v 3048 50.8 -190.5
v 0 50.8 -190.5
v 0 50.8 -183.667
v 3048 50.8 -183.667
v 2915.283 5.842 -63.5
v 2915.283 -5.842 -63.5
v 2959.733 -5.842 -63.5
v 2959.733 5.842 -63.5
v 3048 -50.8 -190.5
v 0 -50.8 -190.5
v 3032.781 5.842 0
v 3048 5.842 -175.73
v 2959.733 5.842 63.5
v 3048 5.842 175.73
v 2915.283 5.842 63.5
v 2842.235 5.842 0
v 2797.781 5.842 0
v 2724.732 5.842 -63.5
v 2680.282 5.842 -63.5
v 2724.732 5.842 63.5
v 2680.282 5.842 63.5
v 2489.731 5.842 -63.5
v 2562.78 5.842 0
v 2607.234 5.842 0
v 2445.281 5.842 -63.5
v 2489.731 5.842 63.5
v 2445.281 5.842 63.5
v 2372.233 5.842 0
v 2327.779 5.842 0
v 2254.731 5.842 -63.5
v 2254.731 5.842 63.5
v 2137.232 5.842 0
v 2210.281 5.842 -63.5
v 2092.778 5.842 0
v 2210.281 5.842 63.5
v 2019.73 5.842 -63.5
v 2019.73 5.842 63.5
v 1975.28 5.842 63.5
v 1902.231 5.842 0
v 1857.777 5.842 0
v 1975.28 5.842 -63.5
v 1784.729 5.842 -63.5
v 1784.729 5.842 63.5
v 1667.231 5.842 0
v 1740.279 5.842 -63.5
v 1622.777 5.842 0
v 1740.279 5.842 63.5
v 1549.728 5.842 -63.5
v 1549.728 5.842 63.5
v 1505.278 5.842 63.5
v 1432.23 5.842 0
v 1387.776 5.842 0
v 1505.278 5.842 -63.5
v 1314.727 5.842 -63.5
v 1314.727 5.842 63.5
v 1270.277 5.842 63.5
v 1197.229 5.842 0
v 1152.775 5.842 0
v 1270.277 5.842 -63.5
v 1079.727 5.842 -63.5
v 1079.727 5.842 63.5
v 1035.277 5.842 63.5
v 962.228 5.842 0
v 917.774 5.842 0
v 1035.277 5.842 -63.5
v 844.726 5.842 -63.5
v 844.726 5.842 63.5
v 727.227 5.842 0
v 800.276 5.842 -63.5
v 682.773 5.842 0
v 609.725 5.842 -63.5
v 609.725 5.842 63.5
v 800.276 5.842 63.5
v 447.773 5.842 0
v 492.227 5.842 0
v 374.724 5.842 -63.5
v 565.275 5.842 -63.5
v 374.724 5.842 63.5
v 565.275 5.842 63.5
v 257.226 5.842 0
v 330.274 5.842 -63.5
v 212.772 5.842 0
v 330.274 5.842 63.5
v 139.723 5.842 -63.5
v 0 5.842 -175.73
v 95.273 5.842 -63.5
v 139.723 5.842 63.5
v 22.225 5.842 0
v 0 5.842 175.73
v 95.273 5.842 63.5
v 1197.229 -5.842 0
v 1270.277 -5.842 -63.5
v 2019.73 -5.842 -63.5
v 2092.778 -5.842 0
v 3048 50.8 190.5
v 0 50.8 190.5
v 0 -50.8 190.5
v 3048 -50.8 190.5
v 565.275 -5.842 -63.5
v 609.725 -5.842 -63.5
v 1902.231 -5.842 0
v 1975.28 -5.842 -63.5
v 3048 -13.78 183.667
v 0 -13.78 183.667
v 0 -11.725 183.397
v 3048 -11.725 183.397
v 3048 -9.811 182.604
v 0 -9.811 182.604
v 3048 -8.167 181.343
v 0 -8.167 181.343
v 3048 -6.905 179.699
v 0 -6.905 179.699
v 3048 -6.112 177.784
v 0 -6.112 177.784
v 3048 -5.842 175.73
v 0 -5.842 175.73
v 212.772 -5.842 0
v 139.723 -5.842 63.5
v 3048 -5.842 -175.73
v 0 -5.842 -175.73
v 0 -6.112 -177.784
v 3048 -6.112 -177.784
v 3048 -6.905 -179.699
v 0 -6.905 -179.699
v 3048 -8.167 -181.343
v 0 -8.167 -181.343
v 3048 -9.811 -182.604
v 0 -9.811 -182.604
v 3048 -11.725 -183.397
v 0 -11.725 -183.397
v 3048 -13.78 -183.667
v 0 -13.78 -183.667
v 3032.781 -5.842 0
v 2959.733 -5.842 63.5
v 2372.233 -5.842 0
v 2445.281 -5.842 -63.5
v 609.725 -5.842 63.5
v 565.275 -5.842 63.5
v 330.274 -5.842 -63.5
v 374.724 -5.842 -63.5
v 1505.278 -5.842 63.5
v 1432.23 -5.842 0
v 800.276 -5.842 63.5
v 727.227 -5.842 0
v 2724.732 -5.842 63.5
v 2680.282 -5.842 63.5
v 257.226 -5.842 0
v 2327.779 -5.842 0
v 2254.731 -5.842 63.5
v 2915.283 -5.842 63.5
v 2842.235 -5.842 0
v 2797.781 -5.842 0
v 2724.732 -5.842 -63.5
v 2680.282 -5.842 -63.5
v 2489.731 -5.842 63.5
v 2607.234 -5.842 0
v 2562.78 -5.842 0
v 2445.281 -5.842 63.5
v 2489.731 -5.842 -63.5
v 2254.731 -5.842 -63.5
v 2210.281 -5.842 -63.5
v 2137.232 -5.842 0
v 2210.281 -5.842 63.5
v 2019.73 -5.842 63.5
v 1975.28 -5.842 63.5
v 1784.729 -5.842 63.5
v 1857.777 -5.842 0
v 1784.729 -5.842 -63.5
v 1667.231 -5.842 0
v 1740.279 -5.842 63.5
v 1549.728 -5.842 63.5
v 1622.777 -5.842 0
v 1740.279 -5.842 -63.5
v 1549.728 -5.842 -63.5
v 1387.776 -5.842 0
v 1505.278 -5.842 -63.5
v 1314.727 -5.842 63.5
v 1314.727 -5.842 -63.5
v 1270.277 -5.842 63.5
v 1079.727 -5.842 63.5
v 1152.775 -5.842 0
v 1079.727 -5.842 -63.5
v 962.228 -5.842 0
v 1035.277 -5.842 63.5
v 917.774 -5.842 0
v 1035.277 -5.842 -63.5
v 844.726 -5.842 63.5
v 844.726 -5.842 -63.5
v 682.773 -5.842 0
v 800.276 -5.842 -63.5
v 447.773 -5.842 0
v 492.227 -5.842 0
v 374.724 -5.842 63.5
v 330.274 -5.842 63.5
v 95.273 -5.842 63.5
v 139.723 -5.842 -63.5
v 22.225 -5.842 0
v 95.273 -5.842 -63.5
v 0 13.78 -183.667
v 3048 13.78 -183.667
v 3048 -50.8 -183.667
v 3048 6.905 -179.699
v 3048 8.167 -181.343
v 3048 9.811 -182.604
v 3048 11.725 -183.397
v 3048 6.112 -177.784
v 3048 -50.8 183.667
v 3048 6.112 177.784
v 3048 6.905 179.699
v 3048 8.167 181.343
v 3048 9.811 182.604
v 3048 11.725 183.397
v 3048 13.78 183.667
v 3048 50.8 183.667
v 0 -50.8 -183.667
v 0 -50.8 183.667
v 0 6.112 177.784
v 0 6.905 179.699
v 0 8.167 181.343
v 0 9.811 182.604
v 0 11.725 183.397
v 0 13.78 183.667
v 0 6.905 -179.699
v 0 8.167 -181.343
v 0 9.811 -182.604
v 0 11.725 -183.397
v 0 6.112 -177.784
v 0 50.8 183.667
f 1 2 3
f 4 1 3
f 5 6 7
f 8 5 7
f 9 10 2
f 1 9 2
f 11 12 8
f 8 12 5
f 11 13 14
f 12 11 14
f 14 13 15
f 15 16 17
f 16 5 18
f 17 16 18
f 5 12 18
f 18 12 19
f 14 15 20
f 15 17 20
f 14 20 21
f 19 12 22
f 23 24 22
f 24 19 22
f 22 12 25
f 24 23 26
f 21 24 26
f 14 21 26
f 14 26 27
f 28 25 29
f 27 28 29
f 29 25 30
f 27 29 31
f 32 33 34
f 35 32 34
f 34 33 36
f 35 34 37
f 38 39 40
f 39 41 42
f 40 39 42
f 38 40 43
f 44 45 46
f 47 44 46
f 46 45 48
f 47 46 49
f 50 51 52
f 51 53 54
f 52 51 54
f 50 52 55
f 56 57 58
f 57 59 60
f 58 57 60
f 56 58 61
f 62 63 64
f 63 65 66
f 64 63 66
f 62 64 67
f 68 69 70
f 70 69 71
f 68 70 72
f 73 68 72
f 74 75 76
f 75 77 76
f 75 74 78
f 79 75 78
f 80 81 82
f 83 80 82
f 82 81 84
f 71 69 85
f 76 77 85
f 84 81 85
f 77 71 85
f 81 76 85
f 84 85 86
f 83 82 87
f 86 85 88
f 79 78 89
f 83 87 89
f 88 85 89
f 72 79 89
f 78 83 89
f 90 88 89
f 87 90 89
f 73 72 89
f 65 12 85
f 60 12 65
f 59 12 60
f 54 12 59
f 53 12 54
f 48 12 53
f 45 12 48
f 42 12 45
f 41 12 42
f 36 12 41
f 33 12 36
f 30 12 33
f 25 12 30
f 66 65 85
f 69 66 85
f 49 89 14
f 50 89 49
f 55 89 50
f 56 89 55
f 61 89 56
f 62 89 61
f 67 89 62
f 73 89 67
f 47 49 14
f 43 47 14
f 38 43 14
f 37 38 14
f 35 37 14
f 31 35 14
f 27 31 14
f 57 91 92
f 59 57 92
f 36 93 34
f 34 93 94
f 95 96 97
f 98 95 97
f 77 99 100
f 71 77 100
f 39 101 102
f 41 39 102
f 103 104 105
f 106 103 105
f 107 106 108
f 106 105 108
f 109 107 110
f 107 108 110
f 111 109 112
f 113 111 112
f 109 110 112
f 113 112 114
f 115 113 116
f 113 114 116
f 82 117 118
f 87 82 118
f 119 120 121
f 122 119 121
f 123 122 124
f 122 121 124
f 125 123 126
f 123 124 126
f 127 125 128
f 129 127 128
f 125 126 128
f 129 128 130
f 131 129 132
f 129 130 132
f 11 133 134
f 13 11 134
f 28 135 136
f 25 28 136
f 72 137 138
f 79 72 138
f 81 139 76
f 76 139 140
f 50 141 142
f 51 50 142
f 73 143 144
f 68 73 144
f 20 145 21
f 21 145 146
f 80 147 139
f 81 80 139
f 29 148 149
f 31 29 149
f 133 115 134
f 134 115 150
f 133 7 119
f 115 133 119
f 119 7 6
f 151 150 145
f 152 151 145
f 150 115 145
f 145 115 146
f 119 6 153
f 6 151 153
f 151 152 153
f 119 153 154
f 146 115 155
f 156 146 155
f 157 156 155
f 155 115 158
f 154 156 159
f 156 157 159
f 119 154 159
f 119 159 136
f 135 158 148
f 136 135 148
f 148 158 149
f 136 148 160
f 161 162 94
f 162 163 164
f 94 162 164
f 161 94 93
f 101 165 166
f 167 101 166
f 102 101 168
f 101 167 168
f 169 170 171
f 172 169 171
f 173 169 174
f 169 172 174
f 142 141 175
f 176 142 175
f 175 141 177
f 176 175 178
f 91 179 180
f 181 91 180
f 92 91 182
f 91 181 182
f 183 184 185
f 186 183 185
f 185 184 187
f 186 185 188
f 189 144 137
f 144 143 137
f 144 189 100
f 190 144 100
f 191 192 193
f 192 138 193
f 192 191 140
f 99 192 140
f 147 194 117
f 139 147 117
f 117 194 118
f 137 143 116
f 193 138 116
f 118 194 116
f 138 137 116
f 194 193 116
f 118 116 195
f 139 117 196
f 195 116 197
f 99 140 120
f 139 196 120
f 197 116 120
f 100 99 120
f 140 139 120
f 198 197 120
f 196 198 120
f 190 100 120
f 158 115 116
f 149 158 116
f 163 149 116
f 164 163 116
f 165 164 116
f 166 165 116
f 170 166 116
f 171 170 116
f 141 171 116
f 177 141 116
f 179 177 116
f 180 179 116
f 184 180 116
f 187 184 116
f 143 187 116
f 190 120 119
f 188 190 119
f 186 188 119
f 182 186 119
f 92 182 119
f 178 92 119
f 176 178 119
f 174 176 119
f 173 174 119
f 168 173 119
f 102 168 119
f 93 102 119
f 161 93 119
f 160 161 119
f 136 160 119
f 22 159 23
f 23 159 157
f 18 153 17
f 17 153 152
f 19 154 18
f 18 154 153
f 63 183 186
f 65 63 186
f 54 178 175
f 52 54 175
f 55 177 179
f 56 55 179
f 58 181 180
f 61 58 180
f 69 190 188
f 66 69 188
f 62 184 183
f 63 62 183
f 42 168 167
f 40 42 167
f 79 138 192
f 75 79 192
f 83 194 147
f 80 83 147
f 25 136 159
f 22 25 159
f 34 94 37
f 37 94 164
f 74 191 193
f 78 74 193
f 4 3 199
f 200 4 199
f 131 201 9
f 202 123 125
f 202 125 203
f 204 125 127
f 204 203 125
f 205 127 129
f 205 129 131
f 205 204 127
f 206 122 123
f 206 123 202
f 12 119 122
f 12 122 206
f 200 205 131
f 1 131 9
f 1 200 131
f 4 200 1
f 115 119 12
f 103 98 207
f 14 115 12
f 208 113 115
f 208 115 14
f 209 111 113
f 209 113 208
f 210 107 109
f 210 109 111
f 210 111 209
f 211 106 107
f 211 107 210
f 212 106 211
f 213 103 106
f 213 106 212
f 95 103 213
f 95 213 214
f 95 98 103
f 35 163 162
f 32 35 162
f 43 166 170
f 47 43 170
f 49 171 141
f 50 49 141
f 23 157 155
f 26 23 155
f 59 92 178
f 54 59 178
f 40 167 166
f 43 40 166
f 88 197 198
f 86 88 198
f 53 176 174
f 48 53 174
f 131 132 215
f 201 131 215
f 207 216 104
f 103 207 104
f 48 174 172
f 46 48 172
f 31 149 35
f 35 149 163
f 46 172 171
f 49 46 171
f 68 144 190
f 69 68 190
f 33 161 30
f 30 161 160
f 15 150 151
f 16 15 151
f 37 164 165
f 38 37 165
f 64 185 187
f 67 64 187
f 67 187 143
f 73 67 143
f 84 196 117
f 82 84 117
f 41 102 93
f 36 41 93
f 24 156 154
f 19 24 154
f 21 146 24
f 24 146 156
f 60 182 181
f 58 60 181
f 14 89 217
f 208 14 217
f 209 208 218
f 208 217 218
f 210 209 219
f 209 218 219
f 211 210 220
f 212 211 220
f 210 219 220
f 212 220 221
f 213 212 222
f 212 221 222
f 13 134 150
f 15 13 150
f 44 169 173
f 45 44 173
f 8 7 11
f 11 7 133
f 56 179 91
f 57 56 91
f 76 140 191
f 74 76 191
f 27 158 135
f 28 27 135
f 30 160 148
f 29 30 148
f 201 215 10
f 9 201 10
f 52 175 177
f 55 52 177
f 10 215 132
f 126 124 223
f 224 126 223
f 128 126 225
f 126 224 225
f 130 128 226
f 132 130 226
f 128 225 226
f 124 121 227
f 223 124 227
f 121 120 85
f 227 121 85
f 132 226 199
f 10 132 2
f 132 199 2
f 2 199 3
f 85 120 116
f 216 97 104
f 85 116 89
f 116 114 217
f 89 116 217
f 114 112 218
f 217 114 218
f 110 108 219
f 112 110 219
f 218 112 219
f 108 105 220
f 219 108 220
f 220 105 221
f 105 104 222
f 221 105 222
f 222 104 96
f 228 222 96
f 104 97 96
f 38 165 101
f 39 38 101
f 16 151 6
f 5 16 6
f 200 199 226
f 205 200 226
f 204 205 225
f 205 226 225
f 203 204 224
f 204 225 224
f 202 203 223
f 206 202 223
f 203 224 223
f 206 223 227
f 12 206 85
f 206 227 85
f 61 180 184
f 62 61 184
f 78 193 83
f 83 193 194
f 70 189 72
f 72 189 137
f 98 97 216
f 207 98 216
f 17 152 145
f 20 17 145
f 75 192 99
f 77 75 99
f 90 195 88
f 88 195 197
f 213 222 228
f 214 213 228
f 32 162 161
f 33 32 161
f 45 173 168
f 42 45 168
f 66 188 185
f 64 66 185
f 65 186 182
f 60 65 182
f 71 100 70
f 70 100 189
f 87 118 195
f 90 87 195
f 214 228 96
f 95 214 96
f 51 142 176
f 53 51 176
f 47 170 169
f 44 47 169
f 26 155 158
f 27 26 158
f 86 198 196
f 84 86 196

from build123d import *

# Parameters (mm, degrees)
F1_DEPTH = 3048
F3_DEPTH = 56.643


with BuildPart() as f1:
    # F0 (on Right) → F1 (new body)
    with BuildSketch(Plane.YZ):
        with BuildLine():
            Line((-5.842, 175.7299), (-5.842, 0))
            Line((-5.842, 0), (-5.842, -175.7299))
            ThreePointArc((-5.842, -175.7299), (-8.16684, -181.34256), (-13.7795, -183.6674))
            Line((-13.7795, -183.6674), (-50.8, -183.6674))
            Line((-50.8, -183.6674), (-50.8, -190.5))
            Line((-50.8, -190.5), (0, -190.5))
            Line((0, -190.5), (50.8, -190.5))
            Line((50.8, -190.5), (50.8, -183.6674))
            Line((50.8, -183.6674), (13.7795, -183.6674))
            ThreePointArc((13.7795, -183.6674), (8.16684, -181.34256), (5.842, -175.7299))
            Line((5.842, -175.7299), (5.842, 0))
            Line((5.842, 0), (5.842, 175.7299))
            ThreePointArc((5.842, 175.7299), (8.16684, 181.34256), (13.7795, 183.6674))
            Line((13.7795, 183.6674), (50.8, 183.6674))
            Line((50.8, 183.6674), (50.8, 190.5))
            Line((50.8, 190.5), (0, 190.5))
            Line((0, 190.5), (-50.8, 190.5))
            Line((-50.8, 190.5), (-50.8, 183.6674))
            Line((-50.8, 183.6674), (-13.7795, 183.6674))
            ThreePointArc((-13.7795, 183.6674), (-8.16684, 181.34256), (-5.842, 175.7299))
        make_face()
    extrude(amount=F1_DEPTH)

    # F2 (on face) → F3 (cut, through all)
    with BuildSketch(Plane.XZ.offset(5.842)):
        Polygon((95.273394, 63.5), (22.225, 0), (95.273394, -63.5), (139.723394, -63.5), (212.771788, 0), (139.723394, 63.5), align=None)
        Polygon((374.724194, 63.5), (330.274194, 63.5), (257.2258, 0), (330.274194, -63.5), (374.724194, -63.5), (447.772588, 0), align=None)
        Polygon((609.724994, 63.5), (565.274994, 63.5), (492.2266, 0), (565.274994, -63.5), (609.724994, -63.5), (682.773388, 0), align=None)
        Polygon((844.725794, 63.5), (800.275794, 63.5), (727.2274, 0), (800.275794, -63.5), (844.725794, -63.5), (917.774188, 0), align=None)
        Polygon((1079.726594, 63.5), (1035.276594, 63.5), (962.2282, 0), (1035.276594, -63.5), (1079.726594, -63.5), (1152.774988, 0), align=None)
        Polygon((1314.727394, 63.5), (1270.277394, 63.5), (1197.229, 0), (1270.277394, -63.5), (1314.727394, -63.5), (1387.775788, 0), align=None)
        Polygon((1549.728194, 63.5), (1505.278194, 63.5), (1432.2298, 0), (1505.278194, -63.5), (1549.728194, -63.5), (1622.776588, 0), align=None)
        Polygon((1784.728994, 63.5), (1740.278994, 63.5), (1667.2306, 0), (1740.278994, -63.5), (1784.728994, -63.5), (1857.777388, 0), align=None)
        Polygon((2019.729794, 63.5), (1975.279794, 63.5), (1902.2314, 0), (1975.279794, -63.5), (2019.729794, -63.5), (2092.778188, 0), align=None)
        Polygon((2254.730594, 63.5), (2210.280594, 63.5), (2137.2322, 0), (2210.280594, -63.5), (2254.730594, -63.5), (2327.778988, 0), align=None)
        Polygon((2489.731394, 63.5), (2445.281394, 63.5), (2372.233, 0), (2445.281394, -63.5), (2489.731394, -63.5), (2562.779788, 0), align=None)
        Polygon((2724.732194, 63.5), (2680.282194, 63.5), (2607.2338, 0), (2680.282194, -63.5), (2724.732194, -63.5), (2797.780588, 0), align=None)
        Polygon((2959.732994, 63.5), (2915.282994, 63.5), (2842.2346, 0), (2915.282994, -63.5), (2959.732994, -63.5), (3032.781388, 0), align=None)
    extrude(amount=-F3_DEPTH, mode=Mode.SUBTRACT)


solid = f1.part
